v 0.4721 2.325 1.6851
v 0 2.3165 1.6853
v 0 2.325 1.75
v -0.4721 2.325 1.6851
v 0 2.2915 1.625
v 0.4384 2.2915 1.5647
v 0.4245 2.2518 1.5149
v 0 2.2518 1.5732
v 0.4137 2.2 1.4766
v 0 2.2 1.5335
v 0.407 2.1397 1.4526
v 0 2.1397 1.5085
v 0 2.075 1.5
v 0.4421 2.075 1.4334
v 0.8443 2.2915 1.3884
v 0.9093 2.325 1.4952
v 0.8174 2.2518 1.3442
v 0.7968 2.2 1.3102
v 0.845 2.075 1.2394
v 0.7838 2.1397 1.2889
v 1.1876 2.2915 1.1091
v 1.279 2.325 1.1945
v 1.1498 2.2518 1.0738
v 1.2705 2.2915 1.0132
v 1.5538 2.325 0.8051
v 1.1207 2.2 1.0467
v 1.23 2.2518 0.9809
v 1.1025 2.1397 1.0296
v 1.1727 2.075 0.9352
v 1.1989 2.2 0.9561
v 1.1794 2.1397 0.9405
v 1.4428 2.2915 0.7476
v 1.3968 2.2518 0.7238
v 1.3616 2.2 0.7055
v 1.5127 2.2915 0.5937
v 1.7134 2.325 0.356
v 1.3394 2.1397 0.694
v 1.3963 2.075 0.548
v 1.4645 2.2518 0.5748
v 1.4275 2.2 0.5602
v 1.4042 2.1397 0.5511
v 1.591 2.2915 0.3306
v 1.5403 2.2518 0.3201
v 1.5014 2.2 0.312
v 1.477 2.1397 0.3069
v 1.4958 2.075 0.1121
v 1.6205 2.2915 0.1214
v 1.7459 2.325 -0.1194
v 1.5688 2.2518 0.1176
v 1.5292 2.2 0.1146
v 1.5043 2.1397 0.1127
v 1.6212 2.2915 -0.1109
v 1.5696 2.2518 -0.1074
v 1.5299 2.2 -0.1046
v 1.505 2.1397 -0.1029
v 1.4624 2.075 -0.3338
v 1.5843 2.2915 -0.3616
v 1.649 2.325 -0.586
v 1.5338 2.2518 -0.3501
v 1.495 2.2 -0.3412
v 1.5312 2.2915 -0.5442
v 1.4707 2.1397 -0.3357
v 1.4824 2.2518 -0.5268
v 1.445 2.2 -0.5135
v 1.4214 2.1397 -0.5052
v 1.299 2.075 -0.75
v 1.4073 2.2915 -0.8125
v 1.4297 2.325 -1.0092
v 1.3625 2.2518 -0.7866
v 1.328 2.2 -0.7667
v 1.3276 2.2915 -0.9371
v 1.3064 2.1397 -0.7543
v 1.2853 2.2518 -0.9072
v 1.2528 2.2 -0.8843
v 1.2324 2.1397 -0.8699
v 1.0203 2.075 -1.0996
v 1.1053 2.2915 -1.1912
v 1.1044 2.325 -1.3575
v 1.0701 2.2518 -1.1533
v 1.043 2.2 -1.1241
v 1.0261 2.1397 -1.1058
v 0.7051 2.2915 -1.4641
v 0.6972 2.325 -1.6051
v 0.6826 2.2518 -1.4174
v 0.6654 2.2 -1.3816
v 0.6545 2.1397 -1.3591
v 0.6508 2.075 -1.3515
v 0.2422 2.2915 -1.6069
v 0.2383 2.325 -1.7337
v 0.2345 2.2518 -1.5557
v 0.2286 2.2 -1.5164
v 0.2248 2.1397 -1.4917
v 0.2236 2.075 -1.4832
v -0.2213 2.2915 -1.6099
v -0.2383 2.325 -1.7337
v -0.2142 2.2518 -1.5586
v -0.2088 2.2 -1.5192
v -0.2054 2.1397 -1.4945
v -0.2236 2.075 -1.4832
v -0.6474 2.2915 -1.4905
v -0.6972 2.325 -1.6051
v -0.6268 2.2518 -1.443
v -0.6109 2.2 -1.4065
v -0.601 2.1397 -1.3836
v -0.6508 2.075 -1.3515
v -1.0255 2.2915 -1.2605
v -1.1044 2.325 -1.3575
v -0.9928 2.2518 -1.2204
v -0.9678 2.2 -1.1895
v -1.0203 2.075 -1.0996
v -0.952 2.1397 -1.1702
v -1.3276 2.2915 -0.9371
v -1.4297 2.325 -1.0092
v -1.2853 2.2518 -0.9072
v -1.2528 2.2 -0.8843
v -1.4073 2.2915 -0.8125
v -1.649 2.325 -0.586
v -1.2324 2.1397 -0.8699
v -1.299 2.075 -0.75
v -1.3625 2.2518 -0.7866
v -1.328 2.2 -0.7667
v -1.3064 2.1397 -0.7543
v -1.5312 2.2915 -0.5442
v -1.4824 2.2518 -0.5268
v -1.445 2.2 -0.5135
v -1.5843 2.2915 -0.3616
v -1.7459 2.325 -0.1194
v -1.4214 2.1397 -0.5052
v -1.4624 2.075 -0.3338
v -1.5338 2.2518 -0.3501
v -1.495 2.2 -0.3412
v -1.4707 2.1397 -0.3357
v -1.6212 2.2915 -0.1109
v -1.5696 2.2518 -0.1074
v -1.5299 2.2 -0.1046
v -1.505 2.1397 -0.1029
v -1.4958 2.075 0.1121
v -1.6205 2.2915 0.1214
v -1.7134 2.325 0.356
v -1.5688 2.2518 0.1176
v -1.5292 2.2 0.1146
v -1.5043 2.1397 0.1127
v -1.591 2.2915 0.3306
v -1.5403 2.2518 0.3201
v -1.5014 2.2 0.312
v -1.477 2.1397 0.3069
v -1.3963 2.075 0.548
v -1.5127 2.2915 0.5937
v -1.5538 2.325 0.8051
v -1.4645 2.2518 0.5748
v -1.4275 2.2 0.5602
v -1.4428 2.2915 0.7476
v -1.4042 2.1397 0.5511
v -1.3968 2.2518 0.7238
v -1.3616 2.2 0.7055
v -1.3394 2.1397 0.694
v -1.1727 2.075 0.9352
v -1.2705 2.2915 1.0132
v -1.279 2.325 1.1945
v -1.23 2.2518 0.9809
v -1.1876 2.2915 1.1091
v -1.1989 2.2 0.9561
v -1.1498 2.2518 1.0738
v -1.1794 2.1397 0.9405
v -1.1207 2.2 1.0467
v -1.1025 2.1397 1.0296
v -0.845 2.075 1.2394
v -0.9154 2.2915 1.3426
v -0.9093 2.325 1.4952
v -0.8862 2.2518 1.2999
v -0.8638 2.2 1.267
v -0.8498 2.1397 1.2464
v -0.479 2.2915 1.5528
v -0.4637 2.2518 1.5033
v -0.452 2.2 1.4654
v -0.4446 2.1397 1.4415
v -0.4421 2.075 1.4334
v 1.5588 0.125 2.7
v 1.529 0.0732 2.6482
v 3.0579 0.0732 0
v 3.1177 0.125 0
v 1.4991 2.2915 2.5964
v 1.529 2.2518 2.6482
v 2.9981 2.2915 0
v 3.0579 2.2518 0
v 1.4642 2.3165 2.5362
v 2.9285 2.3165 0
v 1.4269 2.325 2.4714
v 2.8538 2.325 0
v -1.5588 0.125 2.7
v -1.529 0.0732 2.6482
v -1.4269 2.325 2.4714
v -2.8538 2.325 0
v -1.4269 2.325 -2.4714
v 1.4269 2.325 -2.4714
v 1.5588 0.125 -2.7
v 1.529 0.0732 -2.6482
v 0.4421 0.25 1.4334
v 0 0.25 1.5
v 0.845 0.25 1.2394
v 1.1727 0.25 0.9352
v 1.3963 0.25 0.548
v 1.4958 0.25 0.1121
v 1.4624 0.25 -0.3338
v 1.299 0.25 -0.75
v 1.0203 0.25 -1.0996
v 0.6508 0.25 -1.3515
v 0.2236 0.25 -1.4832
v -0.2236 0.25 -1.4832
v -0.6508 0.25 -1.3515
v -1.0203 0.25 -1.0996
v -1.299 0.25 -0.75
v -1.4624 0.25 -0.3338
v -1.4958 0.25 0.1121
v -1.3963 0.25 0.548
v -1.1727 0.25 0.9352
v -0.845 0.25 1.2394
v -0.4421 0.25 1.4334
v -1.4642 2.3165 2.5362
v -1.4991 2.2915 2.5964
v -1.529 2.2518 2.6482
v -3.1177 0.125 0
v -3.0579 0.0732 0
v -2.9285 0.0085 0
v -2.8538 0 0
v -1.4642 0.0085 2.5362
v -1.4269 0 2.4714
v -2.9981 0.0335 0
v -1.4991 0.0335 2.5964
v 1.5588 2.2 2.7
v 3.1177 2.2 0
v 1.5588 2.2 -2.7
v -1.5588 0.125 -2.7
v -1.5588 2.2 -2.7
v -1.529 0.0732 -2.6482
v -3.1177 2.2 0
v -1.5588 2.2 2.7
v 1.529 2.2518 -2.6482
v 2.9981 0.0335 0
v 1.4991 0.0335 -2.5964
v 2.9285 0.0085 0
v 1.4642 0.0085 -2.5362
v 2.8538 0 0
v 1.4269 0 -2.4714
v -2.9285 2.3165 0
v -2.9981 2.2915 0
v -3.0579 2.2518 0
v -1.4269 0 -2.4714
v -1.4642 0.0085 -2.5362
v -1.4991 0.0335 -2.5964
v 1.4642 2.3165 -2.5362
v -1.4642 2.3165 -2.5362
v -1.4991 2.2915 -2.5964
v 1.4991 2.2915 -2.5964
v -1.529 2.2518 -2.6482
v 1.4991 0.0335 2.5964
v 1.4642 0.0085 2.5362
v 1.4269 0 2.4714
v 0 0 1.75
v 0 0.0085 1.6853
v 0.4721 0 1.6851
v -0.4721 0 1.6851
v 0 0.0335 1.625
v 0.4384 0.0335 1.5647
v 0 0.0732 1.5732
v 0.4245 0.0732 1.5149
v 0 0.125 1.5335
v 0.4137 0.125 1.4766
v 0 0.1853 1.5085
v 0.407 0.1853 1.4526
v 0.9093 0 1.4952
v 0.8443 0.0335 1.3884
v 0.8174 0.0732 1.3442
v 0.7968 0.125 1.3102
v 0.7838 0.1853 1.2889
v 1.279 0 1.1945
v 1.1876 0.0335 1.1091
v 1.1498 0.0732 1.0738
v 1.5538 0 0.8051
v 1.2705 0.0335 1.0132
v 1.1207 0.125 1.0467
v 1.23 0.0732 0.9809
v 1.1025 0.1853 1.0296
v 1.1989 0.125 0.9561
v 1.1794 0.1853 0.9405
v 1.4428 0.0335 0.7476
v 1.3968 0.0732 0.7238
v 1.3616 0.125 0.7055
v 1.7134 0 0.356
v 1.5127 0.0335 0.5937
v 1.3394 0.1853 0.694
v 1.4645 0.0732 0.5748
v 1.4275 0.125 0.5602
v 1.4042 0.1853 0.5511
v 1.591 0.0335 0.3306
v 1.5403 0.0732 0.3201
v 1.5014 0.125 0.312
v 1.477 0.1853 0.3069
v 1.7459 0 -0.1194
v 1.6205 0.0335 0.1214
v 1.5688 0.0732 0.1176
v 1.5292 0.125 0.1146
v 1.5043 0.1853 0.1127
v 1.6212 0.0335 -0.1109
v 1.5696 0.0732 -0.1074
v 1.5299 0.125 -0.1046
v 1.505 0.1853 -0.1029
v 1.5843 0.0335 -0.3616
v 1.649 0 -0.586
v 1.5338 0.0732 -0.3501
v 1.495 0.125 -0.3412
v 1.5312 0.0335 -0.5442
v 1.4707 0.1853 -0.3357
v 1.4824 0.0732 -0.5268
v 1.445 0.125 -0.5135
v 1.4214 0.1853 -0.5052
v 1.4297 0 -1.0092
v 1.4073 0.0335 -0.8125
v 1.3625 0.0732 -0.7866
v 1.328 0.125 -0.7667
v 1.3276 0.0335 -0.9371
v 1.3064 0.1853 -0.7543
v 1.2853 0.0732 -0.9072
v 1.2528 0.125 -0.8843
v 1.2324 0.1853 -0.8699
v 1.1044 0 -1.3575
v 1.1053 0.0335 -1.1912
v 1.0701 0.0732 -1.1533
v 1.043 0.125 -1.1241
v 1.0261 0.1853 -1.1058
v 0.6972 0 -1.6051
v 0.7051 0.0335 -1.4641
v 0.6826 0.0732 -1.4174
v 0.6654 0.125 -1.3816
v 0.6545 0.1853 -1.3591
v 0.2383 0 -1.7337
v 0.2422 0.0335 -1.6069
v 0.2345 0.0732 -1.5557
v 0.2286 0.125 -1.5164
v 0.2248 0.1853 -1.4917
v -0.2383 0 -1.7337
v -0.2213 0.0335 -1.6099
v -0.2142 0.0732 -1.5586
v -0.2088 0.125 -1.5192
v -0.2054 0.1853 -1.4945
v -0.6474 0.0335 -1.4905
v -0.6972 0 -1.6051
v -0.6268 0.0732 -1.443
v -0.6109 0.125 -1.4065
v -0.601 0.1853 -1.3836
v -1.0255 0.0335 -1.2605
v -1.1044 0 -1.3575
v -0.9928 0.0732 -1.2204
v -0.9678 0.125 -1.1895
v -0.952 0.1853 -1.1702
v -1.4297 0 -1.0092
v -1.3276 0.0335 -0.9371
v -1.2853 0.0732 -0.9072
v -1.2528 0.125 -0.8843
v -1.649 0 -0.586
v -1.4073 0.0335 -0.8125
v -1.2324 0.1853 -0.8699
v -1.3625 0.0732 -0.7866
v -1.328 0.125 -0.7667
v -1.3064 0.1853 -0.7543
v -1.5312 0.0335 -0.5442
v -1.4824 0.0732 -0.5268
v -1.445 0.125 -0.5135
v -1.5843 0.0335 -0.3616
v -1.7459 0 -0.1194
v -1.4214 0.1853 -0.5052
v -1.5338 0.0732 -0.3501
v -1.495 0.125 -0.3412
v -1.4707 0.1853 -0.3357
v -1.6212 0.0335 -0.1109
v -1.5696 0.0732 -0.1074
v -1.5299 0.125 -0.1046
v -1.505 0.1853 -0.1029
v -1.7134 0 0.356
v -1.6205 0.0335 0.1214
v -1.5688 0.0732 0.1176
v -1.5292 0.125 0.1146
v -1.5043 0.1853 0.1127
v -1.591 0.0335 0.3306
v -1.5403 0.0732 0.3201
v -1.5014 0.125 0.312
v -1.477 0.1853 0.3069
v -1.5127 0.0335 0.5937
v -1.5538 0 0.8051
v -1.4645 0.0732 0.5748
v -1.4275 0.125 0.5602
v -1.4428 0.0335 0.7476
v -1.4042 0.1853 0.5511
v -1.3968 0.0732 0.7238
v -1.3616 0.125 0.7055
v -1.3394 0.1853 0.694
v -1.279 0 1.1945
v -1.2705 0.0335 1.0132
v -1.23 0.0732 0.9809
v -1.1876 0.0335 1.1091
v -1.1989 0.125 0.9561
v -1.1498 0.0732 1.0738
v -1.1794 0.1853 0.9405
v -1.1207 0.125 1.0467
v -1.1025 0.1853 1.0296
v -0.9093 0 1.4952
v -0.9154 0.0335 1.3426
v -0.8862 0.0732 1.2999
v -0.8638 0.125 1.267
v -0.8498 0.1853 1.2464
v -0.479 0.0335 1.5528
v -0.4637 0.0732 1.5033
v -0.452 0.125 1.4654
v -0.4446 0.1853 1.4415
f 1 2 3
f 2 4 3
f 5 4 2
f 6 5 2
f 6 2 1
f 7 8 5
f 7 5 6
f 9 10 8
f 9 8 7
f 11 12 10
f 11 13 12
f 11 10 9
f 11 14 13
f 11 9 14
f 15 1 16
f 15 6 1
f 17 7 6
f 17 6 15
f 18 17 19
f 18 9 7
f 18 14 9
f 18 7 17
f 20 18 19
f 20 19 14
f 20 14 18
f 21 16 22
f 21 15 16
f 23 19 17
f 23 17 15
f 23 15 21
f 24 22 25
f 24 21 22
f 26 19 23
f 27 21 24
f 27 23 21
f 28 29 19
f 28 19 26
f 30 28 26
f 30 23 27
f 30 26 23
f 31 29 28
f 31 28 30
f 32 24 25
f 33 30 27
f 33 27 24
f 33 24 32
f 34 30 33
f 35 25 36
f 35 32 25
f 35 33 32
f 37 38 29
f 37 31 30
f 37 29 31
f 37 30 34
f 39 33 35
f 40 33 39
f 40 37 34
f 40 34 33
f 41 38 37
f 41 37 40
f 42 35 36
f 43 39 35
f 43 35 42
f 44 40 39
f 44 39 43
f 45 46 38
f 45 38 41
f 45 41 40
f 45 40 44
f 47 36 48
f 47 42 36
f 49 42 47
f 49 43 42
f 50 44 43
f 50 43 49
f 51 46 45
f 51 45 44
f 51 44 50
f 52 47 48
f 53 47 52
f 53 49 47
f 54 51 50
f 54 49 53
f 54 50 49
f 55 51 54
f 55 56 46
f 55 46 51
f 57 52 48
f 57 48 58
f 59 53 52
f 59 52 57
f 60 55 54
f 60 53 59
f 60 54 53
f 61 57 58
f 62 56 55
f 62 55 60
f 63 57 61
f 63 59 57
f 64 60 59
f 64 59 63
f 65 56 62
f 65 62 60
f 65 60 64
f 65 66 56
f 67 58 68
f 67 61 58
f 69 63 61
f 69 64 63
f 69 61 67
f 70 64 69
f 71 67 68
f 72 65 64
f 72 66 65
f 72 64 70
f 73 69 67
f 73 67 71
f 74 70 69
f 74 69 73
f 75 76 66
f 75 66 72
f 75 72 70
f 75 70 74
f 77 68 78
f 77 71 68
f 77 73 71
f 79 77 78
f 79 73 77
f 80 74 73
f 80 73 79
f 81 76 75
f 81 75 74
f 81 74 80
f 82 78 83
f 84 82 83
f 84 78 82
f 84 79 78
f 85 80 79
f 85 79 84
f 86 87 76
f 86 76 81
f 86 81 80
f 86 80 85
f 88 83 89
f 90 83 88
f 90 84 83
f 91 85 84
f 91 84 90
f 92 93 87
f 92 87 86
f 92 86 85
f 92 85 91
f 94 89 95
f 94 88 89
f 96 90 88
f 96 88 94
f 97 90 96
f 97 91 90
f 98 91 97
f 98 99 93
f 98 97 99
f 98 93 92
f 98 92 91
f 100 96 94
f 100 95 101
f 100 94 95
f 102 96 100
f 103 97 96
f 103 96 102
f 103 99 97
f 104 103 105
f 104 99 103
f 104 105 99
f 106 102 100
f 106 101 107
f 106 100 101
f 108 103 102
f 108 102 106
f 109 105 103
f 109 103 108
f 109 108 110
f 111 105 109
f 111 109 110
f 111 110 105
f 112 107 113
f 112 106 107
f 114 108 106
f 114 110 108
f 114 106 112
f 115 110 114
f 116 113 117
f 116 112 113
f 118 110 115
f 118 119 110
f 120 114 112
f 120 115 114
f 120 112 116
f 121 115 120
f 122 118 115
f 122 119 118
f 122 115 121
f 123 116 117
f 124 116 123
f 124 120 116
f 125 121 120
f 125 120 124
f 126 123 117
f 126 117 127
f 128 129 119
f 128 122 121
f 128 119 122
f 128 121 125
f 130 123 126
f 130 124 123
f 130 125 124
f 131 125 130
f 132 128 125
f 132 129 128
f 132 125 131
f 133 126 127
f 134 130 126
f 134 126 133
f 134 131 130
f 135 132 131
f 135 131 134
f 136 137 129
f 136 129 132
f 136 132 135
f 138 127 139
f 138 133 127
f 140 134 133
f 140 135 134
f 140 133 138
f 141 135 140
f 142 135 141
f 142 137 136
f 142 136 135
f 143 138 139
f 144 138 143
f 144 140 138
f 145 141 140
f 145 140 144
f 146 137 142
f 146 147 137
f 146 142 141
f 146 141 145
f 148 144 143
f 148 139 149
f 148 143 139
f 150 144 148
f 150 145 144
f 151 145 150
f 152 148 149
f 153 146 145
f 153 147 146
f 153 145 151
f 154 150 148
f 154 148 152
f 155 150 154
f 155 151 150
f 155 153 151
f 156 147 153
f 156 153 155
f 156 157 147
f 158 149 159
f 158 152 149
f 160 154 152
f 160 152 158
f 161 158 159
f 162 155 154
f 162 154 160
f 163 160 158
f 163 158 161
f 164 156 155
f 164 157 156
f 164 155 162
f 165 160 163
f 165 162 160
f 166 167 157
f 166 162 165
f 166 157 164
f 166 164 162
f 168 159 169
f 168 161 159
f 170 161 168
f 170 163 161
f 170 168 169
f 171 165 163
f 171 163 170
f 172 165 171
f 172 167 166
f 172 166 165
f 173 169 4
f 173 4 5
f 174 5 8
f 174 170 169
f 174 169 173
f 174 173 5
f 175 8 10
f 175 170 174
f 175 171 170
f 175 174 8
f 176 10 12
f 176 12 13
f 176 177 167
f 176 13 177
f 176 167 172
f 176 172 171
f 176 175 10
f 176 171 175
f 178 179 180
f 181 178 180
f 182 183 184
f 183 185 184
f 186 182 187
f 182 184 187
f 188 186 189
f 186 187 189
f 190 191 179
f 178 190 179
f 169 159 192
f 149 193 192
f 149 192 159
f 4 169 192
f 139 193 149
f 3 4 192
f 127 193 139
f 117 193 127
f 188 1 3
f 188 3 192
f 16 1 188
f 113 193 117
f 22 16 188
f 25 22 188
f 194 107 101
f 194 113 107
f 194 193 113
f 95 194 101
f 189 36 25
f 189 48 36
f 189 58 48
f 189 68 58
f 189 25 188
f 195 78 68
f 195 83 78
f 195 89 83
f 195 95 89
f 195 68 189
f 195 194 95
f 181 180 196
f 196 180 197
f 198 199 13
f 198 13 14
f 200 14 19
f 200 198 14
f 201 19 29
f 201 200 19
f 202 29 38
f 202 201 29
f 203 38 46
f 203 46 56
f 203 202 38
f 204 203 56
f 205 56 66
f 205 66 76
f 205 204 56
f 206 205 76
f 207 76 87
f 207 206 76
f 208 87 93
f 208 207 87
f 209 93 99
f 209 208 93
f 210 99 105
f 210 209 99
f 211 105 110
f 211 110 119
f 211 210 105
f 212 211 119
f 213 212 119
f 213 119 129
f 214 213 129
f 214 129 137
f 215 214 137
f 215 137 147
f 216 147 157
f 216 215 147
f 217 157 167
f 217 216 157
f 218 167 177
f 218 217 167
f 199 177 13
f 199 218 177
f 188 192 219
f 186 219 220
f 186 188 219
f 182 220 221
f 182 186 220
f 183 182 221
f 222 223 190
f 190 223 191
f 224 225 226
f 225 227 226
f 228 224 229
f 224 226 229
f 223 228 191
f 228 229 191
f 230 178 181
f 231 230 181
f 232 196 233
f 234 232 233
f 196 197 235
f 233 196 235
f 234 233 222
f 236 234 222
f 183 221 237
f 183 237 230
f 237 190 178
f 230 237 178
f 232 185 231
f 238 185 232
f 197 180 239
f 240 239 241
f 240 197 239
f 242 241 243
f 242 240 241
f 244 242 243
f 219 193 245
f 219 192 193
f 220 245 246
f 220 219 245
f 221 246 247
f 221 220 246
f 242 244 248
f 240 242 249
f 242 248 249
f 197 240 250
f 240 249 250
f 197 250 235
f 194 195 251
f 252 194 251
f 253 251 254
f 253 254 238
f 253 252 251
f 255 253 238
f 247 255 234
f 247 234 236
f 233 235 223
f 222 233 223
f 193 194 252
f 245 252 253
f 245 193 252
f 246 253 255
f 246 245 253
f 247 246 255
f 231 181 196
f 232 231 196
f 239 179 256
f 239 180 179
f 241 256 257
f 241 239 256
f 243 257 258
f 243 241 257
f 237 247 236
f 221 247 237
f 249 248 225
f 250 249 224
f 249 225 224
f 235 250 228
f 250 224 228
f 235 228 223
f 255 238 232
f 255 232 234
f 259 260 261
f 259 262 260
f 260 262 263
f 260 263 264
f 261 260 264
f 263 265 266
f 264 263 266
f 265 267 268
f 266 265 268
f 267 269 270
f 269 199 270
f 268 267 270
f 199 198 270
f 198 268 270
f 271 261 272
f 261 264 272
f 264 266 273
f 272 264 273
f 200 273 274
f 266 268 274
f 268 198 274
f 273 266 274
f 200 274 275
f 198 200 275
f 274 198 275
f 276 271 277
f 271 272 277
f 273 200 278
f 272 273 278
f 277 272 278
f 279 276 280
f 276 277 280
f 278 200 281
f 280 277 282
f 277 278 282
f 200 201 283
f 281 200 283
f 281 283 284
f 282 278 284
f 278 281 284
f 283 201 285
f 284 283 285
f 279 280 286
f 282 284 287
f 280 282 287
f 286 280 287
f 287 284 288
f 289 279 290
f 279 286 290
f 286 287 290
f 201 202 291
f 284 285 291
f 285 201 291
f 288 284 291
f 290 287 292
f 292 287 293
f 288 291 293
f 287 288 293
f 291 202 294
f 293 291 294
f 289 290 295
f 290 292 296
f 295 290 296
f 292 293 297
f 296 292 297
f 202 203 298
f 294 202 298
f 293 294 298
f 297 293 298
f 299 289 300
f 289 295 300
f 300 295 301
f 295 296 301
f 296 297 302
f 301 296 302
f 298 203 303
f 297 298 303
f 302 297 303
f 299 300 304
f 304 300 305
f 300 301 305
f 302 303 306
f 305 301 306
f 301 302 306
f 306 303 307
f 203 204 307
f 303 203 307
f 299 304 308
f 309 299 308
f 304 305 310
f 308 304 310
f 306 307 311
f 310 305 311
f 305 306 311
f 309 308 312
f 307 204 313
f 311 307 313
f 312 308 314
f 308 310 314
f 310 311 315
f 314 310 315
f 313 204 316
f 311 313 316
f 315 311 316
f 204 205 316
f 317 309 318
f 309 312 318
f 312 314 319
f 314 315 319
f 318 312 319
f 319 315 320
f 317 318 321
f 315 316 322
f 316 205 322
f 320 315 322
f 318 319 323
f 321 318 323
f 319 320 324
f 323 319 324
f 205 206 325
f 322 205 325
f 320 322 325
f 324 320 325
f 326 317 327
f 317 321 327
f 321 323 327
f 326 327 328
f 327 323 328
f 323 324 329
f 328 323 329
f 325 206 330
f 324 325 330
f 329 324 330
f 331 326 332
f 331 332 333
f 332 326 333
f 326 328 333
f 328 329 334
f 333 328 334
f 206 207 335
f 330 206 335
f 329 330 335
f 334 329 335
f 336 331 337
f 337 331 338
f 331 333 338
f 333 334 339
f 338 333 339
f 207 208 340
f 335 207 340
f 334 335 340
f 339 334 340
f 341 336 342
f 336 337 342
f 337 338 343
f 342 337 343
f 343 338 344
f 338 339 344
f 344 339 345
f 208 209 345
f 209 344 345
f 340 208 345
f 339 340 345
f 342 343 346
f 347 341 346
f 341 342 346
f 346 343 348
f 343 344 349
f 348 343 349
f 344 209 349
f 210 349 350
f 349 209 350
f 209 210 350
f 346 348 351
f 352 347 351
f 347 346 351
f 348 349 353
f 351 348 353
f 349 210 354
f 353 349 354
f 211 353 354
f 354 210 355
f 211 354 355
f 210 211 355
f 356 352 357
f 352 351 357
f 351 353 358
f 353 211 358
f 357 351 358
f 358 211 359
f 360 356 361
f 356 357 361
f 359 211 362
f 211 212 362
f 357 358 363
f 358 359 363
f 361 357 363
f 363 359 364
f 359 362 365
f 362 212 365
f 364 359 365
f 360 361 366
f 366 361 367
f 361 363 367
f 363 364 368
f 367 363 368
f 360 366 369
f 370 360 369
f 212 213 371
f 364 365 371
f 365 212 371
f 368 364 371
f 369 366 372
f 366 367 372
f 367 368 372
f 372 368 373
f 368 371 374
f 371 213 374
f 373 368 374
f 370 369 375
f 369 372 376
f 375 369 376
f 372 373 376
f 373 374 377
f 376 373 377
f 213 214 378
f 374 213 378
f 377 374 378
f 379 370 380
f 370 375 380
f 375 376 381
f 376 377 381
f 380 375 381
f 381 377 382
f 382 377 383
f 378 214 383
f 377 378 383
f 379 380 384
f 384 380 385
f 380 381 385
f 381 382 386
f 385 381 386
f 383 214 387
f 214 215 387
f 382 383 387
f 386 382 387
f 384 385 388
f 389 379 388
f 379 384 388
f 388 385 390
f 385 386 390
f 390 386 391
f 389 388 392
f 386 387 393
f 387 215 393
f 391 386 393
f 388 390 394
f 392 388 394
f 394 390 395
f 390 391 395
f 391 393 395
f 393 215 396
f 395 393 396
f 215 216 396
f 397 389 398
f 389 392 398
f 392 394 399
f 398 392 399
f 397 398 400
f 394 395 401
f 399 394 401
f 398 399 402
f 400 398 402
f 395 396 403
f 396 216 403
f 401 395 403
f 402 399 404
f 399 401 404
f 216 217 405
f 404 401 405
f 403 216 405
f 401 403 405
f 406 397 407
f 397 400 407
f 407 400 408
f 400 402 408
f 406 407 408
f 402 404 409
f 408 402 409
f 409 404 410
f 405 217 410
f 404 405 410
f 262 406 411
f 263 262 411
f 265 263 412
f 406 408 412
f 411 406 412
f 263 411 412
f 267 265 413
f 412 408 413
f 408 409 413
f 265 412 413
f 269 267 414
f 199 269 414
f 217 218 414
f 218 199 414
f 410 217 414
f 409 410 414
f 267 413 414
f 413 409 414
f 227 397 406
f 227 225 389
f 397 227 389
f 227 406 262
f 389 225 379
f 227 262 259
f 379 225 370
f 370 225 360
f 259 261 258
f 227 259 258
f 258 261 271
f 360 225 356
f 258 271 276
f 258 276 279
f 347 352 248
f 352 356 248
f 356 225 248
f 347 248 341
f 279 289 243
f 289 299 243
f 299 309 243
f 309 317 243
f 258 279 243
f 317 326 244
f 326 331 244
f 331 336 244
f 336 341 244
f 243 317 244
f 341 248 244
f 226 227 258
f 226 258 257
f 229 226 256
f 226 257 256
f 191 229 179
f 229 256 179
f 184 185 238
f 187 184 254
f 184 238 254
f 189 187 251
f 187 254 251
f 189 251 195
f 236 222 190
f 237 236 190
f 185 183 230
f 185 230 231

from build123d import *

# Parameters (mm, degrees)
SKETCH1_R           = 1.5
BOSS_EXTRUDE1_DEPTH = 2.325
CHAMFER1_SIZE       = 0.125
FILLET1_R           = 0.25


with BuildPart() as part:
    # Sketch1 → Boss-Extrude1 (new body)
    with BuildSketch(Plane(origin=(0, 0, 0), x_dir=(1, 0, 0), z_dir=(0, 1, 0))):
        Polygon((3.117691454, 0), (1.558845727, 2.7), (-1.558845727, 2.7), (-3.117691454, 0), (-1.558845727, -2.7), (1.558845727, -2.7), align=None)
        with Locations(Location((0, 0, 0), (0, 0, 270))):
            Circle(SKETCH1_R, mode=Mode.SUBTRACT)
    extrude(amount=BOSS_EXTRUDE1_DEPTH)

    # Chamfer1
    chamfer1_edges = [part.edges().sort_by_distance(p)[0] for p in [
        (0, 2.325, -2.7),
        (-2.33826859, 2.325, -1.35),
        (-2.33826859, 2.325, 1.35),
        (0, 2.325, 2.7),
        (2.33826859, 2.325, 1.35),
        (0, 0, 2.7),
        (-2.33826859, 0, 1.35),
        (-2.33826859, 0, -1.35),
        (0, 0, -2.7),
        (2.33826859, 0, -1.35),
        (2.33826859, 0, 1.35),
        (2.33826859, 2.325, -1.35),
    ]]
    chamfer(chamfer1_edges, length=CHAMFER1_SIZE)

    # Fillet1
    fillet1_edges = [part.edges().sort_by_distance(p)[0] for p in [
        (0, 0, -1.5),
        (0, 2.325, -1.5),
        (-2.230015415, 0, 1.2875),
        (0, 0, 2.575),
        (2.230015415, 0, 1.2875),
        (-2.230015415, 0, -1.2875),
        (0, 0, -2.575),
        (2.230015415, 0, -1.2875),
        (-2.230015415, 2.325, 1.2875),
        (-2.230015415, 2.325, -1.2875),
        (0, 2.325, -2.575),
        (2.230015415, 2.325, -1.2875),
        (2.230015415, 2.325, 1.2875),
        (0, 2.325, 2.575),
    ]]
    fillet(fillet1_edges, radius=FILLET1_R)


solid = part.part
